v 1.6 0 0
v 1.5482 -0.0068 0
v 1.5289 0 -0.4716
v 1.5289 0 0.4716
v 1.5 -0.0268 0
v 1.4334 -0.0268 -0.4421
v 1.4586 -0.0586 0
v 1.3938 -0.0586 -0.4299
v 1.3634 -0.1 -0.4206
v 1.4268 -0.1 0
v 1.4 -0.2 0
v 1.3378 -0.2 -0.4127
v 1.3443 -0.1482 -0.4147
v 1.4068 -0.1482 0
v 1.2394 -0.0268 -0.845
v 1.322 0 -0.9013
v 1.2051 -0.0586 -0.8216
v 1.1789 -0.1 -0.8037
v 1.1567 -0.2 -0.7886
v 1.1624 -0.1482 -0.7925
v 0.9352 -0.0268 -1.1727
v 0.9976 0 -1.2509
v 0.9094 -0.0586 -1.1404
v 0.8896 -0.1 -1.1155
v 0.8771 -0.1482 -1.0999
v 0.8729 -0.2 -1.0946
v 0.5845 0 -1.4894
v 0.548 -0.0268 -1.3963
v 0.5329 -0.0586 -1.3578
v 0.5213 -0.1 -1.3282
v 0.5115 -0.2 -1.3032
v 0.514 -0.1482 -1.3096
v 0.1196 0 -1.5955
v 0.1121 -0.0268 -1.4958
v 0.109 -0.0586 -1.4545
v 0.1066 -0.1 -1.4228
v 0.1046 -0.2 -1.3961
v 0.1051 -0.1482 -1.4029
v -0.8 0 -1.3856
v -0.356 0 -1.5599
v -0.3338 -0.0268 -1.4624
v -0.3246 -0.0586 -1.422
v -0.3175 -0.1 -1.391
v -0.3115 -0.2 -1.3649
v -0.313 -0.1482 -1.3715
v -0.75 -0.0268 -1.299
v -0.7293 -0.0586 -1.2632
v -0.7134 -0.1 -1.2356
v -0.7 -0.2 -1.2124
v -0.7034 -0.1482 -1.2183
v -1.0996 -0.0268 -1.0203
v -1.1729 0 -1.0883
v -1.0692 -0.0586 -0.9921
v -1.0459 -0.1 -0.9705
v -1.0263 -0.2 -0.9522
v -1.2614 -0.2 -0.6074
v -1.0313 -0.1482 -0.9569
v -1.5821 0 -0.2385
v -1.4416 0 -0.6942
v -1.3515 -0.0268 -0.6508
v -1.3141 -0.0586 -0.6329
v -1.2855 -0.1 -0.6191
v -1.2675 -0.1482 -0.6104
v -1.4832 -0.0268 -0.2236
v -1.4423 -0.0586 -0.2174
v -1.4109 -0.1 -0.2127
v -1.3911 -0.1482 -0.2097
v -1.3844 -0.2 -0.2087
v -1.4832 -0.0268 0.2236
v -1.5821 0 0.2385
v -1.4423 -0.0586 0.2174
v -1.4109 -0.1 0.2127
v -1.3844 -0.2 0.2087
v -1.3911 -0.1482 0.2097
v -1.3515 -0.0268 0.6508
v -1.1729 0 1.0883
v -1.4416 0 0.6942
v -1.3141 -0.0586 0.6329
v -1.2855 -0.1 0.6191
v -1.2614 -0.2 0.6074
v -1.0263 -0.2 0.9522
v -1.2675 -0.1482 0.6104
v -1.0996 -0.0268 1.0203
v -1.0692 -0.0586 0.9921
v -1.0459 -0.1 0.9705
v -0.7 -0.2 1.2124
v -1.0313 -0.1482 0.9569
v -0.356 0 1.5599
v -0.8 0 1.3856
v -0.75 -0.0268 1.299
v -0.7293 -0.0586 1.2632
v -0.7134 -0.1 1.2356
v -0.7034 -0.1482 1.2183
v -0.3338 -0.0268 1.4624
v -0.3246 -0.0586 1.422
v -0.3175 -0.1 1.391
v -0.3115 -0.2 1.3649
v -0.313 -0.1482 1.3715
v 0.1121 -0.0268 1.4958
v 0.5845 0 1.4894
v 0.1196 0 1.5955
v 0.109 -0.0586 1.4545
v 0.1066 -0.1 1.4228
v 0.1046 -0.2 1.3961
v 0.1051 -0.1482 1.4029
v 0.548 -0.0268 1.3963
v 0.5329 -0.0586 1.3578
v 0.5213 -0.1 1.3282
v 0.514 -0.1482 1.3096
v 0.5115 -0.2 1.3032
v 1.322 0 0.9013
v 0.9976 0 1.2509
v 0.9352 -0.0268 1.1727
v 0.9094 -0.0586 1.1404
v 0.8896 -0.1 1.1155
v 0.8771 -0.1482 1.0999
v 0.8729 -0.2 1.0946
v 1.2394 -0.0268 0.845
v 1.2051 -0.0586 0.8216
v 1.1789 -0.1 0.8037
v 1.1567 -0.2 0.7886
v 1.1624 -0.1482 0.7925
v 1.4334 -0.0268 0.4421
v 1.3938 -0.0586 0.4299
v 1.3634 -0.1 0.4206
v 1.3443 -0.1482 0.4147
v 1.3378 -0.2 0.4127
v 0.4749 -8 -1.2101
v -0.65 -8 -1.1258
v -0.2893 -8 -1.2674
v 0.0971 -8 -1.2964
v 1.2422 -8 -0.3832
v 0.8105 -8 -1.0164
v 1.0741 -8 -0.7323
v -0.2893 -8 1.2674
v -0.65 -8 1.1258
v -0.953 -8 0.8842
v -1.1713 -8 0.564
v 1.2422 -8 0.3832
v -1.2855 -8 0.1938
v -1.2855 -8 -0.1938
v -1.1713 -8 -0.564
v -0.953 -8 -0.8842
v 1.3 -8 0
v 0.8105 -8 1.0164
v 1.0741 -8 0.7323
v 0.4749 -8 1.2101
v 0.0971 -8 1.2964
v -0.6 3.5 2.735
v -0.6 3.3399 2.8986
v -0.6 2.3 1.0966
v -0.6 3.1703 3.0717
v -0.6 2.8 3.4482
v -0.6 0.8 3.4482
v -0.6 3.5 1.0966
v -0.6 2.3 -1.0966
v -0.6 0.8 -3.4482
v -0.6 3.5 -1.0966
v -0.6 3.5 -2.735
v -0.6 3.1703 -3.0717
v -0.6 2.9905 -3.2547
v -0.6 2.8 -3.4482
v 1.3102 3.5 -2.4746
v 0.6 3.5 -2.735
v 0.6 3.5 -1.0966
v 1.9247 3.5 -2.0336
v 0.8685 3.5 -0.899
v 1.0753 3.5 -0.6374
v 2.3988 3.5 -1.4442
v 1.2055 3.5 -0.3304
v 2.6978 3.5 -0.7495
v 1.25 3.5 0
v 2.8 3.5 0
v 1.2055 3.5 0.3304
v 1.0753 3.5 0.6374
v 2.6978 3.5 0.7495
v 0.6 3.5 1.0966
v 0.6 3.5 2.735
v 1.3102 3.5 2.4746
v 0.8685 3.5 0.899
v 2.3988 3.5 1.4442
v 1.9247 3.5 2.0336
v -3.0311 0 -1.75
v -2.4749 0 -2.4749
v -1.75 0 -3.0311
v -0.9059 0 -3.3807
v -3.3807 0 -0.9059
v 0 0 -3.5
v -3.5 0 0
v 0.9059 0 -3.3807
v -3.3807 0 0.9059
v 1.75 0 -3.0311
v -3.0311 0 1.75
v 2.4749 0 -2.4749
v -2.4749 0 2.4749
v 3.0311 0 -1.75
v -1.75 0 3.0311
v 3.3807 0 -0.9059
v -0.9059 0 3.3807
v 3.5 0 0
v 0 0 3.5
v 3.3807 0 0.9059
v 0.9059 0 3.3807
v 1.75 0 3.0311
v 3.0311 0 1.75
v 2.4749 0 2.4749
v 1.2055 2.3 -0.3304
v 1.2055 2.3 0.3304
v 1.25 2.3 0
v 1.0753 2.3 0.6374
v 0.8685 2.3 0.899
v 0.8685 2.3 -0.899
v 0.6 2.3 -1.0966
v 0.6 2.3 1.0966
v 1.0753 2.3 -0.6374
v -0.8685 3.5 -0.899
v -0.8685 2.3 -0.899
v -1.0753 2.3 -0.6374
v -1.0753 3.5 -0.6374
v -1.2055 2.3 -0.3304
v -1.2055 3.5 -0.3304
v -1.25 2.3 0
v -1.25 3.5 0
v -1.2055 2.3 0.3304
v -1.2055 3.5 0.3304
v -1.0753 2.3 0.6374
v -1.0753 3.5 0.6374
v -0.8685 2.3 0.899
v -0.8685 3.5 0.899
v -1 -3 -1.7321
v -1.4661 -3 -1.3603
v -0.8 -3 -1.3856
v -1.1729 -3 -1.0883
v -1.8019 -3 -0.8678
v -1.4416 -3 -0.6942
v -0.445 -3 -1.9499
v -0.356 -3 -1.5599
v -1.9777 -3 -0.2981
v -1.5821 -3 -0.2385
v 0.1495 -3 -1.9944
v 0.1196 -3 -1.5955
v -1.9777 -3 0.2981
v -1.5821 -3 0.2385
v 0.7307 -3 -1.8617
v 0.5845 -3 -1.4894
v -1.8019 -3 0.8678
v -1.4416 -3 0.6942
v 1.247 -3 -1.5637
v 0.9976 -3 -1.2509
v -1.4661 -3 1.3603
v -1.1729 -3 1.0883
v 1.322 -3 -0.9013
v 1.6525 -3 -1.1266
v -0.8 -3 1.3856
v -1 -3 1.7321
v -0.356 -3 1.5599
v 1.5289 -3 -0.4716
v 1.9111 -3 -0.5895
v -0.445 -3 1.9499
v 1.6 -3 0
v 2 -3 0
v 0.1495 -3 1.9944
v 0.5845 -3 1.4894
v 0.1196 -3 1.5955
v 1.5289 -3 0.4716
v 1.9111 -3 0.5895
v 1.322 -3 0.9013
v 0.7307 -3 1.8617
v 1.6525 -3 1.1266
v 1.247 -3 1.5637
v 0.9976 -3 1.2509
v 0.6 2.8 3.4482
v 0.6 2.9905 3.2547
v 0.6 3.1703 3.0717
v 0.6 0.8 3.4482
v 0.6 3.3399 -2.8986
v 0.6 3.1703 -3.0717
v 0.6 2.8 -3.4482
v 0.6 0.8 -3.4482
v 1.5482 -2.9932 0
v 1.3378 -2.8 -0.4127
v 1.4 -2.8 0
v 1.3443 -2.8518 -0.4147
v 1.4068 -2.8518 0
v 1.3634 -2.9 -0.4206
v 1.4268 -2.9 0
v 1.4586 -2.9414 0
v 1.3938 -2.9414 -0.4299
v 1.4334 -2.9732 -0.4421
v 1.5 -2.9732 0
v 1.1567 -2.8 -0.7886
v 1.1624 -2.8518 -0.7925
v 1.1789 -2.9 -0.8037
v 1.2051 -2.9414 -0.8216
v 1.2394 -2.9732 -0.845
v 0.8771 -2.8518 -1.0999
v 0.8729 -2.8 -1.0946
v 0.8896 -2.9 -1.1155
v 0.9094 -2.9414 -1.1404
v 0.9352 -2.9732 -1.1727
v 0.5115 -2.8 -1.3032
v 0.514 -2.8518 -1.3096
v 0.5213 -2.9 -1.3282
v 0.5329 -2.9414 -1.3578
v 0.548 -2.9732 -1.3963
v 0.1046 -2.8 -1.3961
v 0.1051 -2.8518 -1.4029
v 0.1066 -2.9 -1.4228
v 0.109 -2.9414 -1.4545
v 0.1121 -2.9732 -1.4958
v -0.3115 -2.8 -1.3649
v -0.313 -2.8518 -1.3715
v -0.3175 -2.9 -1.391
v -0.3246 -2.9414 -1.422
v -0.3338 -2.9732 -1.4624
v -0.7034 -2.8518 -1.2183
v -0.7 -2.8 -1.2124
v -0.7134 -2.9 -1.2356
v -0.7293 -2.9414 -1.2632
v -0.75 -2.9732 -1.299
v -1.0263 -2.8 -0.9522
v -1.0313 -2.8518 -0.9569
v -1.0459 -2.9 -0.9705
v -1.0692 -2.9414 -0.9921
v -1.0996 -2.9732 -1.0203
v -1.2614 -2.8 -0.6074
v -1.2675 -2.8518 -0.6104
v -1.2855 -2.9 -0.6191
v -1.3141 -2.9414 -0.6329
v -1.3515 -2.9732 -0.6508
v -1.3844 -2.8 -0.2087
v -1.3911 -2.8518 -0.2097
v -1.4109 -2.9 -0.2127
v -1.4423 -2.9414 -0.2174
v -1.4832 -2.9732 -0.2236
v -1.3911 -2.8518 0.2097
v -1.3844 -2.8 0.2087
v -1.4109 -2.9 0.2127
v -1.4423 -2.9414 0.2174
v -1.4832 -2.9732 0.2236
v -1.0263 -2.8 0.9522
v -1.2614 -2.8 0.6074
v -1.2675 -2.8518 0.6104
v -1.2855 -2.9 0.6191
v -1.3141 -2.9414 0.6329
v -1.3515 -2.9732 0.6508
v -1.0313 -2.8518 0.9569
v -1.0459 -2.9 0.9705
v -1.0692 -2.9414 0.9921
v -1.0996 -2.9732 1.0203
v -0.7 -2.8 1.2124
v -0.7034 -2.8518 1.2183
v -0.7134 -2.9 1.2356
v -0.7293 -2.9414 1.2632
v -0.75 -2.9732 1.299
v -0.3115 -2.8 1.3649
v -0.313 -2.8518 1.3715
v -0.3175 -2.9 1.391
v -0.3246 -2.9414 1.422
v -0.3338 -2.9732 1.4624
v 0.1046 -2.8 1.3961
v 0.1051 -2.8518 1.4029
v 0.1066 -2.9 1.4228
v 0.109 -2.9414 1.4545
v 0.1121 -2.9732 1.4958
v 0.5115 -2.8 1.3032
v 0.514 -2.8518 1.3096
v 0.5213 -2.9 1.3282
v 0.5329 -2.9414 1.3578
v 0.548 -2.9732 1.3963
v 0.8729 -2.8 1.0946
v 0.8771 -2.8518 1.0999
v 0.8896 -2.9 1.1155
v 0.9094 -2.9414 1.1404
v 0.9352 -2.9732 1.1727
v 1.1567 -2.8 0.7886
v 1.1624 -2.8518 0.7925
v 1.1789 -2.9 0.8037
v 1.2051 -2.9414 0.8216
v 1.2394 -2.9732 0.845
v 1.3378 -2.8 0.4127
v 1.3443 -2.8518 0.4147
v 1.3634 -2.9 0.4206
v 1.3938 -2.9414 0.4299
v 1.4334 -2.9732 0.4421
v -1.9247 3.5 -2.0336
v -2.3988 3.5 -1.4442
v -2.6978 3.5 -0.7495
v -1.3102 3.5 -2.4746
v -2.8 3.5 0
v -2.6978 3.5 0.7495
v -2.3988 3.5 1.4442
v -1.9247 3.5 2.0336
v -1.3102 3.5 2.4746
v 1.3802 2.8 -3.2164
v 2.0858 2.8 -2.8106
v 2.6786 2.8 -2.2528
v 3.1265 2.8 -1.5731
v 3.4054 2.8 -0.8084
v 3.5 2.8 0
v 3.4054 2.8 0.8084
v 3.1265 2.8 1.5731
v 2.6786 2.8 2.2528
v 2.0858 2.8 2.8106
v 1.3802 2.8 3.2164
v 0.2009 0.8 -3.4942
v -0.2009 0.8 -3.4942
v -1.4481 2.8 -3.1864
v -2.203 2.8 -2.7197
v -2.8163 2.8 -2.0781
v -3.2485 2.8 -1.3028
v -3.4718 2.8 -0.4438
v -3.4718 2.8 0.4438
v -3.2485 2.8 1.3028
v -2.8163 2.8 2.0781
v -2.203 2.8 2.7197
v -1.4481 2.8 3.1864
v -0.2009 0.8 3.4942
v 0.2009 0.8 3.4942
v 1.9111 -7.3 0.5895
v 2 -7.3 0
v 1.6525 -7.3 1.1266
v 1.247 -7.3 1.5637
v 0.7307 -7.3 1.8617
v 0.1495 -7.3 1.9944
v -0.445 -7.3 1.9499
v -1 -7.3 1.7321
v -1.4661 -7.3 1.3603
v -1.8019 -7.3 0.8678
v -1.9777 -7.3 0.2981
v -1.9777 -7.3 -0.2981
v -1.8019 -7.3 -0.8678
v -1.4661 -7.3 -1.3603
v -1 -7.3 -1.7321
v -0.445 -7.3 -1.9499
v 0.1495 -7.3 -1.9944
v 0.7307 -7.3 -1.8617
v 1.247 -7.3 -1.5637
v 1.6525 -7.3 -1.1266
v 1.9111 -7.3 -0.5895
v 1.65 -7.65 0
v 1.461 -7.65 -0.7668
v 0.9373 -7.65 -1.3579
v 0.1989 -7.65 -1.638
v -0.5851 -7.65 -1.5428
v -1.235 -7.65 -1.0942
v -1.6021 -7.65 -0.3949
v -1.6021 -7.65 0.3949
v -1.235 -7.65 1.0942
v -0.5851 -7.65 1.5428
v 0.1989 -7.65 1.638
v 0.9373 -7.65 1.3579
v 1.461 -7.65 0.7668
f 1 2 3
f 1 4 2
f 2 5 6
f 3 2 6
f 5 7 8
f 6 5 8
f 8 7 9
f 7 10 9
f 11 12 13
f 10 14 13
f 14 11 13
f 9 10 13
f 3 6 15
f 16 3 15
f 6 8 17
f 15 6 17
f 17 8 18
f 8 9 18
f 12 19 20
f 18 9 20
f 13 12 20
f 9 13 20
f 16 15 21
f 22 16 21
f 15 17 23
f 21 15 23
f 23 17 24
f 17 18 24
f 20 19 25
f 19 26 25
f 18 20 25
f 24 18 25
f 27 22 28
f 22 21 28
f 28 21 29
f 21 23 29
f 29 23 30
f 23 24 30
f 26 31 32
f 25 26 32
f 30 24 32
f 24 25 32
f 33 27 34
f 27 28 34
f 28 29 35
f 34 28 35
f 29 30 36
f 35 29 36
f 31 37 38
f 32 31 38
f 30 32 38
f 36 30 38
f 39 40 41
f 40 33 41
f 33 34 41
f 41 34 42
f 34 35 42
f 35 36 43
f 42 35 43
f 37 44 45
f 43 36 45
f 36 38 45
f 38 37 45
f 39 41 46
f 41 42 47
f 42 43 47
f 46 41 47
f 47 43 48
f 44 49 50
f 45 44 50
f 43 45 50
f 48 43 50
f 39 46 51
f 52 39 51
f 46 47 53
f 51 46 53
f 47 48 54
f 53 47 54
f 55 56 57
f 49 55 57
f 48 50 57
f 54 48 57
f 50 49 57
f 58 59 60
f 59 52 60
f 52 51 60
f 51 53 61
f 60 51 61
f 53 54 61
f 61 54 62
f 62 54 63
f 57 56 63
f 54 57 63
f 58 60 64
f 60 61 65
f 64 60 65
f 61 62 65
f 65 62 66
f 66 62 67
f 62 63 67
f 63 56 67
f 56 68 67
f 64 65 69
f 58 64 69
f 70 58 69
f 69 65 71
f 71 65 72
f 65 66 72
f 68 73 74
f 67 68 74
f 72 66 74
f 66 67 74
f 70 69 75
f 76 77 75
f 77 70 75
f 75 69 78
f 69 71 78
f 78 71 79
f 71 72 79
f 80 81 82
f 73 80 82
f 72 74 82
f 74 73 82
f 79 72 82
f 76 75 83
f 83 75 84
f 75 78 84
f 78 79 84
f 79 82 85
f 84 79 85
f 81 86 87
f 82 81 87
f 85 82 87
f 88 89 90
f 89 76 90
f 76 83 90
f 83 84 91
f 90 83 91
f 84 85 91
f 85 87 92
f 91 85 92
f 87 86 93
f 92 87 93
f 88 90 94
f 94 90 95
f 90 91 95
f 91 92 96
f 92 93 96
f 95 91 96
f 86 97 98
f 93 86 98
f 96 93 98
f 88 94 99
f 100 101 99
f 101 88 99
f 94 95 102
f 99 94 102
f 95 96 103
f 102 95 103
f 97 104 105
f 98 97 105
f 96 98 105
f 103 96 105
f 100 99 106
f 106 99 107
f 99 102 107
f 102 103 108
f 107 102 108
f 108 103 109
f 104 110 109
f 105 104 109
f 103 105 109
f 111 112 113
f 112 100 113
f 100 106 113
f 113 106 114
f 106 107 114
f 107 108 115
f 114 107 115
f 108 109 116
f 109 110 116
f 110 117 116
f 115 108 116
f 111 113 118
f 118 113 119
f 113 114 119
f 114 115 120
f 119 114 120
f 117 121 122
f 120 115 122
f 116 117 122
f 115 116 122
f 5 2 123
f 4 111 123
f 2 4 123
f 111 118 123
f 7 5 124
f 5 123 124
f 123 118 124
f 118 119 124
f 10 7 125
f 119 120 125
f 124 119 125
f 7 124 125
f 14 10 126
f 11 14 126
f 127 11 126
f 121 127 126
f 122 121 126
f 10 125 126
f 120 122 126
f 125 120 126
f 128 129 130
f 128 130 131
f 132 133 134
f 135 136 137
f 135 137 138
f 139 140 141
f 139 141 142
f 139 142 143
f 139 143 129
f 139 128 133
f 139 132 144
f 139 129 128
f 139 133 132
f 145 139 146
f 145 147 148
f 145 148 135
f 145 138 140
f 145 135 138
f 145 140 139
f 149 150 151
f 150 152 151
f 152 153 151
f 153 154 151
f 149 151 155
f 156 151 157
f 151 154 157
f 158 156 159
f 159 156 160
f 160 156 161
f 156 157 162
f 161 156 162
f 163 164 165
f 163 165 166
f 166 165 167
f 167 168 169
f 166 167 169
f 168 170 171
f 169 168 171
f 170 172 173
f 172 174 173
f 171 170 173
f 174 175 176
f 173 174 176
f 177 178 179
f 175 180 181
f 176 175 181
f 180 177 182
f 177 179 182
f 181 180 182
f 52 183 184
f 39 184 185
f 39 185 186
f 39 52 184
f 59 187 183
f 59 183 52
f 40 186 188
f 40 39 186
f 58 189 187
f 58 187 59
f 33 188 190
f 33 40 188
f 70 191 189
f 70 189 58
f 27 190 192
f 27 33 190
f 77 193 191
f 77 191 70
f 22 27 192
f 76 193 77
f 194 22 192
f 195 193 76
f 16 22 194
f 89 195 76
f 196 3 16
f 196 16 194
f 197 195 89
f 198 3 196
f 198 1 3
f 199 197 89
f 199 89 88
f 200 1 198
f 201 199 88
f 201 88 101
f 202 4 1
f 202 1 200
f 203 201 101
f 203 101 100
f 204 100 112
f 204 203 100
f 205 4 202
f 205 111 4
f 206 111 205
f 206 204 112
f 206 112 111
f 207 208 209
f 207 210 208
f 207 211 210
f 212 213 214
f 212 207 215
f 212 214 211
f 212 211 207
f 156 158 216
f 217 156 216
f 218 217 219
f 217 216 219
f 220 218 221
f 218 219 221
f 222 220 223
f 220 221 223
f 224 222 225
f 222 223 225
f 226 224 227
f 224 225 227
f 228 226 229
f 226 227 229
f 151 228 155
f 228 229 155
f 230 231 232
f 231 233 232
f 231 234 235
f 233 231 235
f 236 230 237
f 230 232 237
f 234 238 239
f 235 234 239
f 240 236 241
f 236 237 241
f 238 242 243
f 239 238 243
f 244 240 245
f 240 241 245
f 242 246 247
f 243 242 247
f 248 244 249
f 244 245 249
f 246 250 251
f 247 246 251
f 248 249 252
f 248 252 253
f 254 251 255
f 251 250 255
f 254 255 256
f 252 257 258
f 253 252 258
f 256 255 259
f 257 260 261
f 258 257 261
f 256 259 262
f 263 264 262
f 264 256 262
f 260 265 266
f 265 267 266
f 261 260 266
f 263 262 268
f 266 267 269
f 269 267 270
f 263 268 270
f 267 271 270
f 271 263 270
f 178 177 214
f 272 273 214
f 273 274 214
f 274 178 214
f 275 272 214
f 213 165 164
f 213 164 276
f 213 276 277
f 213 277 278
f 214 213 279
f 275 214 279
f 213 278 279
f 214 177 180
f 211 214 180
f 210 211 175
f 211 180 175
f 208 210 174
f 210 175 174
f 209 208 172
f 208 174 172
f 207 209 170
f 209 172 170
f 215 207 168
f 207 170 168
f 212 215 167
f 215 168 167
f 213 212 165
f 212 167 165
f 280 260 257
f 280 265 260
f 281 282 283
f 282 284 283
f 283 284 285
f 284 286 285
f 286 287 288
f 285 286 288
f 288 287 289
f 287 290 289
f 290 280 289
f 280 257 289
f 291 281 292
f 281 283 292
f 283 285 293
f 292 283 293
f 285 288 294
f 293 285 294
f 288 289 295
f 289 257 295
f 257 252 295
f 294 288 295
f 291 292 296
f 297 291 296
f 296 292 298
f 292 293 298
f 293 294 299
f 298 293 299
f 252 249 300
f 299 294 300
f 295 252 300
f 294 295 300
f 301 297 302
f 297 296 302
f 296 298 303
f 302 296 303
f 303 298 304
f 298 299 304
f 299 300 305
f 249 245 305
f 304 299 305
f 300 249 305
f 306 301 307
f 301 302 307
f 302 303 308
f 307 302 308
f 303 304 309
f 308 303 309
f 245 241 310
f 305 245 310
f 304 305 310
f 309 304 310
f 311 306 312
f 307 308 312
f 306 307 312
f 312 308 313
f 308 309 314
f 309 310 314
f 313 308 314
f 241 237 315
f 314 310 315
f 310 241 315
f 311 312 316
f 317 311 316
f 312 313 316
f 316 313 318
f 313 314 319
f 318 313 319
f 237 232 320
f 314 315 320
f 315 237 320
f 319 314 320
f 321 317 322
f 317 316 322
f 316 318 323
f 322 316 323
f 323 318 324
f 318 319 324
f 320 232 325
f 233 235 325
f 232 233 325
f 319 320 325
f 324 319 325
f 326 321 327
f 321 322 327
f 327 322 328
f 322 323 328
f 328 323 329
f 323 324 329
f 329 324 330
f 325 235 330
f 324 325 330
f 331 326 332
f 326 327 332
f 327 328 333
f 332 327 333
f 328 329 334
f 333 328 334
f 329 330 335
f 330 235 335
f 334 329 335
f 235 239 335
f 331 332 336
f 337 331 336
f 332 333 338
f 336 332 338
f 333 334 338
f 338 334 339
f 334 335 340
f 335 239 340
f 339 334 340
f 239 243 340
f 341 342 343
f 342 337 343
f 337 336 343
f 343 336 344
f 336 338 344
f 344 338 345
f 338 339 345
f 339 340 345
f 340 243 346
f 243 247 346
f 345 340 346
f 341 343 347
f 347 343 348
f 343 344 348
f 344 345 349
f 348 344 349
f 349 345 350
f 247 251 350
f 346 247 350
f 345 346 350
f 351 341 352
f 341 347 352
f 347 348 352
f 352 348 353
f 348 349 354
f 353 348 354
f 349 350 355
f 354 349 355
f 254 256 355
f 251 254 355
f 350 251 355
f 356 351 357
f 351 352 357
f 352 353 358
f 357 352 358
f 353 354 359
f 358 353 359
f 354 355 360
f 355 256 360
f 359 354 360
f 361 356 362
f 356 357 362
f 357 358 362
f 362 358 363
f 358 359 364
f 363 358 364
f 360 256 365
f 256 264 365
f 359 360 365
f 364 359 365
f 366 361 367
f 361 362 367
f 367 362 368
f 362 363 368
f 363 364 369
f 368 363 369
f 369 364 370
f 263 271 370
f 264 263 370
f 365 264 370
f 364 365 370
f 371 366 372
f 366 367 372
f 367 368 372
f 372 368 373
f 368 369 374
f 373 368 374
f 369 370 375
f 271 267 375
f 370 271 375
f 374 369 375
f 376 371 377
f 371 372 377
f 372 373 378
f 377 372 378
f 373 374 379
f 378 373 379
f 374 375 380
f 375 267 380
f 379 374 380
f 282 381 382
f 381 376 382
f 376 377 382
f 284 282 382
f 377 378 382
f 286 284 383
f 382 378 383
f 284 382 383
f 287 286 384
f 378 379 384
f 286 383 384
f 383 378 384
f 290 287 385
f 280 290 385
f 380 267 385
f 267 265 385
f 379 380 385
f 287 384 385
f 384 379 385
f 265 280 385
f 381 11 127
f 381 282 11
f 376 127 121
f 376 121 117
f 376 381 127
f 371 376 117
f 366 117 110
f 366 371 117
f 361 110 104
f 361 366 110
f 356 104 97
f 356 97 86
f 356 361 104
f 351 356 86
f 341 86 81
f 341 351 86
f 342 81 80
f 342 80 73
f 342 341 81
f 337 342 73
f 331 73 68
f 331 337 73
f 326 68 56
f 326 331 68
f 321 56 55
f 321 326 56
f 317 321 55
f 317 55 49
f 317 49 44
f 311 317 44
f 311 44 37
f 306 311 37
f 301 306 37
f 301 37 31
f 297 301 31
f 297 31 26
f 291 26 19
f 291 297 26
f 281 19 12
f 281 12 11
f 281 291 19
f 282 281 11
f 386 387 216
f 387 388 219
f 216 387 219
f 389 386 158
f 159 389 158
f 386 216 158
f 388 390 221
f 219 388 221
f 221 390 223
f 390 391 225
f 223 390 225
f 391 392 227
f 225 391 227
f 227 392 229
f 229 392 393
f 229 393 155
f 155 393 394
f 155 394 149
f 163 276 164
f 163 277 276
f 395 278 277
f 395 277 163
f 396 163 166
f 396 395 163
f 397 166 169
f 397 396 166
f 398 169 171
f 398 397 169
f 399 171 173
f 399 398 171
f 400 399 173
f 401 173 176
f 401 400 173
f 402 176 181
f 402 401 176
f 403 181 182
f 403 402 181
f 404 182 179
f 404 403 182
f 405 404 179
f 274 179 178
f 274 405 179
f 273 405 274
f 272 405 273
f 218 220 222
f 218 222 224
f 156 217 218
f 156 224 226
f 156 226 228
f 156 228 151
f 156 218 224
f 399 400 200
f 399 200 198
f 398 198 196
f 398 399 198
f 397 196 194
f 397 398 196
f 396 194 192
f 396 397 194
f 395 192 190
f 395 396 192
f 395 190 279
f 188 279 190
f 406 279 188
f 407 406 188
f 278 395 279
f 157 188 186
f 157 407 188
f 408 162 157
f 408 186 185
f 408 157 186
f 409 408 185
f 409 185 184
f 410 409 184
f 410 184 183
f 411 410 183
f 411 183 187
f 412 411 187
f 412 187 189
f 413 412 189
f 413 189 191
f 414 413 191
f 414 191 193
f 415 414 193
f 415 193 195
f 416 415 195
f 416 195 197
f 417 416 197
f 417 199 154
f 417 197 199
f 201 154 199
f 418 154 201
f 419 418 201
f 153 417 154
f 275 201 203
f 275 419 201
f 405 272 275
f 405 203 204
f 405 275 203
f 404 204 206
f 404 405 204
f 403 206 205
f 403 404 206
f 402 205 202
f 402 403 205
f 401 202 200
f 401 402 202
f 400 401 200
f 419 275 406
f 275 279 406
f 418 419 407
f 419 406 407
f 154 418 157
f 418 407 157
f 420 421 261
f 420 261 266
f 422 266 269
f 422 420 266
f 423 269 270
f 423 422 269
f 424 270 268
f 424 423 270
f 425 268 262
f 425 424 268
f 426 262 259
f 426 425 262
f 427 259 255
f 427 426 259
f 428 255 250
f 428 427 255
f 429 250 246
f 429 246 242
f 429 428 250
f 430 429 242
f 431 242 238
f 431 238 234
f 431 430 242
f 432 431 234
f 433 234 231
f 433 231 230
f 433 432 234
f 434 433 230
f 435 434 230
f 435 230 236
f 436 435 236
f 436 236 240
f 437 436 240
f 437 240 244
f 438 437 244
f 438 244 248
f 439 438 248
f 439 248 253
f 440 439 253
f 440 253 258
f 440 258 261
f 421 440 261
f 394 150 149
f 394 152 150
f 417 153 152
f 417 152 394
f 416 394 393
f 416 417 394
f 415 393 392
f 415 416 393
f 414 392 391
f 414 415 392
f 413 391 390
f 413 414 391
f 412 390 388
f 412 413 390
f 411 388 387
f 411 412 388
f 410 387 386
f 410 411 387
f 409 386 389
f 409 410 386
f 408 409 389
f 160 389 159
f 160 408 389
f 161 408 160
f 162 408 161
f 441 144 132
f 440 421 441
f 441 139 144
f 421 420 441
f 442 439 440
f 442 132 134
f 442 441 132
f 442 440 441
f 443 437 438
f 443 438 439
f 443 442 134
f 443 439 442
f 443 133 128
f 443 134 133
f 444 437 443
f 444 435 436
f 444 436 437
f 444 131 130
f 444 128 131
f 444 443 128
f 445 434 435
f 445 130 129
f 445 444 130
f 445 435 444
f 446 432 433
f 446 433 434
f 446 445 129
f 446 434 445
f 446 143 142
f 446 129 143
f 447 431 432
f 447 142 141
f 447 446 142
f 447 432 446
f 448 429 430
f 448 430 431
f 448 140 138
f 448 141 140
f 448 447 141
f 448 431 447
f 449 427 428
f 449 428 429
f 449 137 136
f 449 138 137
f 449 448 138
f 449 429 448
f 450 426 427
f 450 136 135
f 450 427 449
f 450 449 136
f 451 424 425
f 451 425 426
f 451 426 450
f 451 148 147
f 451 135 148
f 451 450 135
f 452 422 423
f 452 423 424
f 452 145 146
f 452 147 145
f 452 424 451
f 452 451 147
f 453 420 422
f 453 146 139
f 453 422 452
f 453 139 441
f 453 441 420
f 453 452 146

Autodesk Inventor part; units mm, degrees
ref_plane "YZ Plane" through (0, 0, 0) normal (1, 0, 0) x (0, 1, 0)
ref_plane "XZ Plane" through (0, 0, 0) normal (0, 1, 0) x (-1, 0, 0)
ref_plane "XY Plane" through (0, 0, 0) normal (0, 0, 1) x (1, 0, 0)
sketch "Sketch1" plane through (0, 0, 0) normal (0, 0, 1) x (1, 0, 0)
  line L0 (3.5, 0) -> (3.5, 3.5)
  line L1 (3.5, 3.5) -> (0, 3.5)
  line L2 (3.5, 0) -> (1.4, 0)
  line L3 (1.4, 0) -> (1.4, -3)
  line L4 (1.4, -3) -> (2, -3)
  line L5 (2, -3) -> (2, -8)
  line L6 (2, -8) -> (0, -8)
  line L7 (0, 3.5) -> (0, -8)
  point P0 (0, 0)
  dimension "d0" = 7
  dimension "d2" = 2.8
  dimension "d3" = 4
  dimension "d4" = 3.5
  dimension "d5" = 5
  dimension "d6" = 8
revolve "Вращение1" add sketch "Sketch1" angle 360 about axis through (0, 3.5, 0) along (0, -1, 0)
sketch "Sketch2" plane through (0, 3.5, 0) normal (0, 1, 0) x (1, 0, 0)
  circle A0 centre (0, 0) radius 3.5 construction
  circle A1 centre (0, 0) radius 1.25
  dimension "d31" = 2.5
extrude "Выдавливание1" cut sketch "Sketch2" against normal blind 1.2
chamfer "Фаска1" distance 0.7 angle 45 1 edges at (-3.5, 3.5, 0)
sketch "Sketch3" plane through (0, 0, 0) normal (0, 0, 1) x (1, 0, 0)
  line L0 (0, 0) -> (0, 3.5)
  line L1 (-2.3552, 0) -> (2.3552, 0) construction
  line L2 (-3.5, 3.5) -> (3.5, 3.5) construction
  line L3 (-0.6, 3.5) -> (0.6, 3.5)
  line L4 (0.6, 3.5) -> (0.6, 0.8)
  line L5 (0.6, 0.8) -> (-0.6, 0.8)
  line L6 (-0.6, 0.8) -> (-0.6, 3.5)
  dimension "d8" = 0.8
  dimension "d9" = 1.2
extrude "Выдавливание2" cut sketch "Sketch3" along normal through all both and the other way through all
fillet "Сопряжение1" radius 0.2 2 edges at (-1.4, 0, 0) (-1.4, -3, 0)
thread "Резьба1" size "M4x0.7" class "6g" standard "ISO Metric profile" length 5
chamfer "Фаска2" distance 0.7 angle 45 1 edges at (-2, -8, 0)
equation "\"d31\" = d3_"
equation "\"d32\" = h3"
equation "\"d21\" = C1"
equation "\"d8\" = h2"
equation "\"d9\" = n"
equation "\"d12\" = R"
equation "\"d13\" = b"
equation "\"d15\" = C1"
equation "\"d0\" = D"
equation "\"d2\" = d1"
equation "\"d3\" = d_"
equation "\"d4\" = k1"
equation "\"d5\" = b"
equation "\"d6\" = l_"
equation "\"D\" = 7"
equation "\"d_\" = 4"
equation "\"l_\" = 8"
equation "\"b\" = 5"
equation "\"d1\" = 2.8"
equation "\"R\" = 0.2"
equation "\"C1\" = 0.7"
equation "\"h2\" = 0.8"
equation "\"n\" = 1.2"
equation "\"h3\" = 1.2"
equation "\"k1\" = 3.5"
equation "\"d3_\" = 2.5"
equation "\"G\" = l_ - b"
properties part number "Винт 3 M4-6gx8 ГОСТ 10336-80" material "Сталь, мягкая"
